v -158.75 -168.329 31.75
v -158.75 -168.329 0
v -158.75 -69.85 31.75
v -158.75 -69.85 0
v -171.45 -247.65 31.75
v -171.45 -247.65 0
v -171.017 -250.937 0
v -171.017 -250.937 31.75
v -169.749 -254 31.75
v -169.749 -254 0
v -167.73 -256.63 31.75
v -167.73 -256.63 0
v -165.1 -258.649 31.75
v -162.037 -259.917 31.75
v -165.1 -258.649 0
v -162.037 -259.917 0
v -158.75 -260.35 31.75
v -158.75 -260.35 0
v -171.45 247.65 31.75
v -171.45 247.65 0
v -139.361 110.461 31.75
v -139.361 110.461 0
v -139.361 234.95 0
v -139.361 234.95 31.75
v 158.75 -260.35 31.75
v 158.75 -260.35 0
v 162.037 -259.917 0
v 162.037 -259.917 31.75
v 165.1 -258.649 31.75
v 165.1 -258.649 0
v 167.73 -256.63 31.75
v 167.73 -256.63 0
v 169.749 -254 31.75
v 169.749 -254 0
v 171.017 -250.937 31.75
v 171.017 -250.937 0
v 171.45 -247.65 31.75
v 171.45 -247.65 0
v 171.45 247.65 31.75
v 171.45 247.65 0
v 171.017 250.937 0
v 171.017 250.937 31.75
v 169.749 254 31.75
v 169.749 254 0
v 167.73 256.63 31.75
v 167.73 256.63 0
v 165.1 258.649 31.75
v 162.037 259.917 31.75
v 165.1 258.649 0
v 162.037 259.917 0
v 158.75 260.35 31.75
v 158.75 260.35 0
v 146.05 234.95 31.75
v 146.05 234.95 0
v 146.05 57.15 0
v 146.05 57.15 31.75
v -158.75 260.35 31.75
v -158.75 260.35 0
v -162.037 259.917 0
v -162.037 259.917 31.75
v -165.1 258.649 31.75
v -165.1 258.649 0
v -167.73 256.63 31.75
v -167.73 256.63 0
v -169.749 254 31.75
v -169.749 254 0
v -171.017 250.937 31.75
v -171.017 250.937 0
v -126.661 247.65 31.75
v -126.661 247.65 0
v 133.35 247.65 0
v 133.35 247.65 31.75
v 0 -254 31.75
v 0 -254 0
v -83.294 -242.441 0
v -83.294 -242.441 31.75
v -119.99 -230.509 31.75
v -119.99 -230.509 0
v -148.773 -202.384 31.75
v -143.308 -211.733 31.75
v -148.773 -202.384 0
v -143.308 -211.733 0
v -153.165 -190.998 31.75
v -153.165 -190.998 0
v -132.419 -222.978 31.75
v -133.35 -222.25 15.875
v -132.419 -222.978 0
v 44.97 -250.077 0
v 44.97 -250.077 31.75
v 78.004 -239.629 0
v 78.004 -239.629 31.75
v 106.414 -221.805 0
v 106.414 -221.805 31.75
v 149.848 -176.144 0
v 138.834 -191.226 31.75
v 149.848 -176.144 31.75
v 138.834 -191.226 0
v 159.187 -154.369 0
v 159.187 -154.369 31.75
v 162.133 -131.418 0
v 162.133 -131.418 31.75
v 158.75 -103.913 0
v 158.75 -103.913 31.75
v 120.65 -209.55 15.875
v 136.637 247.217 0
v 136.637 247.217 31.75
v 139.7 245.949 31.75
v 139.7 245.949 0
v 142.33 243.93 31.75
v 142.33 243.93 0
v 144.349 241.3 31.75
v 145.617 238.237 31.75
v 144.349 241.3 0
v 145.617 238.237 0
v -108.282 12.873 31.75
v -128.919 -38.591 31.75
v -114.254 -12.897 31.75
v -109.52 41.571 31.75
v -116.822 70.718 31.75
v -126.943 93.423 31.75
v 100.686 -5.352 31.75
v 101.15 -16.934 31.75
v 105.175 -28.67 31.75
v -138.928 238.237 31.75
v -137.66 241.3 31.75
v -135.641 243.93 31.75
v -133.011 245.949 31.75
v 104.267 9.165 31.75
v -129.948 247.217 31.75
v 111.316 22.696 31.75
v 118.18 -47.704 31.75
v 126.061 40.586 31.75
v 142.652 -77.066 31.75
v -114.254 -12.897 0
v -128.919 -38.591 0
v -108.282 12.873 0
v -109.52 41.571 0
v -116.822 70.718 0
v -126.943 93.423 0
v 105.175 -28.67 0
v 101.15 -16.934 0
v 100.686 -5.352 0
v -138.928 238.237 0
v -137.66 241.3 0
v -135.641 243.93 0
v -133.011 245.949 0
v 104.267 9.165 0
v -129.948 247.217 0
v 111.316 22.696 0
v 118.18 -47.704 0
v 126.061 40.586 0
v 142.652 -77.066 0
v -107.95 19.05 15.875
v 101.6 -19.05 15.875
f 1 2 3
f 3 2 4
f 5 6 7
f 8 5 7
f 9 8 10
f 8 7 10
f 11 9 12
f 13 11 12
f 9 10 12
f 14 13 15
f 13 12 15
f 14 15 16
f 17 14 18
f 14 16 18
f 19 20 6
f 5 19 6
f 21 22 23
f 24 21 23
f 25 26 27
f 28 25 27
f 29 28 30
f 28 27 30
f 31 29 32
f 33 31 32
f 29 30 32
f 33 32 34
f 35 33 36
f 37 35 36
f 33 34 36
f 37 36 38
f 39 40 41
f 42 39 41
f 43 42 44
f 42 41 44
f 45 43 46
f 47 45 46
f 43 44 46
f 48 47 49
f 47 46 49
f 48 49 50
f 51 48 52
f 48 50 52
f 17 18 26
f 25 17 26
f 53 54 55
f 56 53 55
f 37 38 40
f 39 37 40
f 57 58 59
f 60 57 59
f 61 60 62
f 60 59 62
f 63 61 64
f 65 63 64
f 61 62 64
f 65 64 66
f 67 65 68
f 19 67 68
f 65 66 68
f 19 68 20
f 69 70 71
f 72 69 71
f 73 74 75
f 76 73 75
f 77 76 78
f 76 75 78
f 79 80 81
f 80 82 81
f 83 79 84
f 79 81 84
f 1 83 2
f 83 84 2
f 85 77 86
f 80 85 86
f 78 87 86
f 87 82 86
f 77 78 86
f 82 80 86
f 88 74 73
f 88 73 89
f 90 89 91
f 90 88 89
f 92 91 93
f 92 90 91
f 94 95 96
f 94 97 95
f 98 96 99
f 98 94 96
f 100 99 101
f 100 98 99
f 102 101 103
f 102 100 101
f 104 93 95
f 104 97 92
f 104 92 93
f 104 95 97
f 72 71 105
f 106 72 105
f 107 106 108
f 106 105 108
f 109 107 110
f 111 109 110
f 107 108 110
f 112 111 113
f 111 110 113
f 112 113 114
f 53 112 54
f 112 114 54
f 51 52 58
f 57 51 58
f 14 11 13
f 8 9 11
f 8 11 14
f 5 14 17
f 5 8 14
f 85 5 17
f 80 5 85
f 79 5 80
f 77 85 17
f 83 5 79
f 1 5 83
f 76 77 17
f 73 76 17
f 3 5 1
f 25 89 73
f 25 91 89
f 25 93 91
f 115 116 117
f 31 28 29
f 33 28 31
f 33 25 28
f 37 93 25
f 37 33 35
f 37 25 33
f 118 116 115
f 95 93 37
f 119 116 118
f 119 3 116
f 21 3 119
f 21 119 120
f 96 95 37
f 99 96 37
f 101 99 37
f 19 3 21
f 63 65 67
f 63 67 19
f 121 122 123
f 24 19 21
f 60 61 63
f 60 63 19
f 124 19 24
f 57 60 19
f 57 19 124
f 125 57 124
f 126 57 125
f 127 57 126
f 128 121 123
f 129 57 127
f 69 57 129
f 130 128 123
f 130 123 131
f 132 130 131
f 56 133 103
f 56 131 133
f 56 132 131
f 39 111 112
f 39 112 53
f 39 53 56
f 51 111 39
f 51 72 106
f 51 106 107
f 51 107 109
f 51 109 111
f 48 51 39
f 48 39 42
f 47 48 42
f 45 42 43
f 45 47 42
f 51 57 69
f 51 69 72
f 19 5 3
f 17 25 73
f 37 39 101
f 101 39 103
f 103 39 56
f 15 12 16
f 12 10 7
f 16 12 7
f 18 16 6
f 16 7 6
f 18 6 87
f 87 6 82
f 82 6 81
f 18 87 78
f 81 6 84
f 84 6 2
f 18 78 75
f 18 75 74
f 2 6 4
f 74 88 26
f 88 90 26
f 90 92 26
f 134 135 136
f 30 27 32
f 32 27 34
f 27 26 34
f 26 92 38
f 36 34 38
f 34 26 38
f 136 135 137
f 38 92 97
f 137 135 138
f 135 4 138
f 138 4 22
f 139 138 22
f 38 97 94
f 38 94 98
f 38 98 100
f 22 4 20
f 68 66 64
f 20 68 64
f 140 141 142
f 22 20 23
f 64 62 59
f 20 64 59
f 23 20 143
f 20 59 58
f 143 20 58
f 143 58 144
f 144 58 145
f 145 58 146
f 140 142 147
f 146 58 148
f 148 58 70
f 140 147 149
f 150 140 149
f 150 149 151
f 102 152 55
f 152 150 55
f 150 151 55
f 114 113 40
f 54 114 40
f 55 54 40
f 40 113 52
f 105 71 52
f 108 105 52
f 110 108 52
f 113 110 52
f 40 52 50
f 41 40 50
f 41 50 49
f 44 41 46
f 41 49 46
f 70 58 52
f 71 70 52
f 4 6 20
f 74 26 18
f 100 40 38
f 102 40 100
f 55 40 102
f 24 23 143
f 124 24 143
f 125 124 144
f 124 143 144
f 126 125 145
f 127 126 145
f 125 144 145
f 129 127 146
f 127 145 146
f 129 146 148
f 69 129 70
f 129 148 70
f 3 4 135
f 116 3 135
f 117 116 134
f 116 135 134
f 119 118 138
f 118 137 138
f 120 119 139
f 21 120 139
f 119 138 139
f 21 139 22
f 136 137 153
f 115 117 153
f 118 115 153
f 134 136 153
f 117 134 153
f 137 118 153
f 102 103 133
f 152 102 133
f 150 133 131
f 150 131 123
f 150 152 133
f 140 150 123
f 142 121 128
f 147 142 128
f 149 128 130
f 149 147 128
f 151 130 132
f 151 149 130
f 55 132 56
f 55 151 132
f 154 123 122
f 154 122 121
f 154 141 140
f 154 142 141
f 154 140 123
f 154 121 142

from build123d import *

# Parameters (mm, degrees)
F1_DEPTH = 31.75


with BuildPart() as f1:
    # F0 (on Top) → F1 (new body)
    with BuildSketch(Plane.XY):
        with BuildLine():
            Line((158.75, 260.35), (-158.75, 260.35))
            ThreePointArc((-158.75, 260.35), (-167.7302561211, 256.6302561211), (-171.45, 247.65))
            Line((-171.45, 247.65), (-171.45, -247.65))
            ThreePointArc((-171.45, -247.65), (-167.7302561211, -256.6302561211), (-158.75, -260.35))
            Line((-158.75, -260.35), (158.75, -260.35))
            ThreePointArc((158.75, -260.35), (167.7302561211, -256.6302561211), (171.45, -247.65))
            Line((171.45, -247.65), (171.45, 247.65))
            ThreePointArc((171.45, 247.65), (167.7302561211, 256.6302561211), (158.75, 260.35))
        make_face()
        with BuildLine():
            Line((-158.75, -168.3286130428), (-158.75, -69.85))
            add(Edge.make_bspline(
                [(-158.75, -69.85), (-125.750682879, -40.734982306), (-92.2382944115, 10.2020752056), (-121.6770256204, 92.6806720408), (-139.361128211, 110.4611489052)],
                knots=[0, 0, 0, 0, 0.5072023317, 1, 1, 1, 1], degree=3))
            Line((-139.361128211, 110.4611489052), (-139.361128211, 234.95))
            ThreePointArc((-139.361128211, 234.95), (-135.6413843321, 243.9302561211), (-126.661128211, 247.65))
            Line((-126.661128211, 247.65), (133.35, 247.65))
            ThreePointArc((133.35, 247.65), (142.3302561211, 243.9302561211), (146.05, 234.95))
            Line((146.05, 234.95), (146.05, 57.15))
            add(Edge.make_bspline(
                [(158.75, -103.9126433709), (142.5402943494, -66.7878627422), (75.9442820469, -25.835811925), (113.945925891, 34.7133202034), (146.05, 57.15)],
                knots=[0, 0, 0, 0, 0.5185201768, 1, 1, 1, 1], degree=3))
            add(Edge.make_bspline(
                [(0, -254), (66.0359377439, -253.8050247003), (118.9910289501, -216.3077578574), (171.45, -158.2672882658), (158.75, -103.9126433709)],
                knots=[0, 0, 0, 0, 0.5169156089, 1, 1, 1, 1], degree=3))
            add(Edge.make_bspline(
                [(0, -254), (-50.4826754374, -248.7984731698), (-144.7156709879, -239.3790961357), (-154.3932279359, -188.1159541937), (-158.75, -168.3286130428)],
                knots=[0, 0, 0, 0, 0.6026238082, 1, 1, 1, 1], degree=3))
        make_face(mode=Mode.SUBTRACT)
    extrude(amount=F1_DEPTH)


solid = f1.part
